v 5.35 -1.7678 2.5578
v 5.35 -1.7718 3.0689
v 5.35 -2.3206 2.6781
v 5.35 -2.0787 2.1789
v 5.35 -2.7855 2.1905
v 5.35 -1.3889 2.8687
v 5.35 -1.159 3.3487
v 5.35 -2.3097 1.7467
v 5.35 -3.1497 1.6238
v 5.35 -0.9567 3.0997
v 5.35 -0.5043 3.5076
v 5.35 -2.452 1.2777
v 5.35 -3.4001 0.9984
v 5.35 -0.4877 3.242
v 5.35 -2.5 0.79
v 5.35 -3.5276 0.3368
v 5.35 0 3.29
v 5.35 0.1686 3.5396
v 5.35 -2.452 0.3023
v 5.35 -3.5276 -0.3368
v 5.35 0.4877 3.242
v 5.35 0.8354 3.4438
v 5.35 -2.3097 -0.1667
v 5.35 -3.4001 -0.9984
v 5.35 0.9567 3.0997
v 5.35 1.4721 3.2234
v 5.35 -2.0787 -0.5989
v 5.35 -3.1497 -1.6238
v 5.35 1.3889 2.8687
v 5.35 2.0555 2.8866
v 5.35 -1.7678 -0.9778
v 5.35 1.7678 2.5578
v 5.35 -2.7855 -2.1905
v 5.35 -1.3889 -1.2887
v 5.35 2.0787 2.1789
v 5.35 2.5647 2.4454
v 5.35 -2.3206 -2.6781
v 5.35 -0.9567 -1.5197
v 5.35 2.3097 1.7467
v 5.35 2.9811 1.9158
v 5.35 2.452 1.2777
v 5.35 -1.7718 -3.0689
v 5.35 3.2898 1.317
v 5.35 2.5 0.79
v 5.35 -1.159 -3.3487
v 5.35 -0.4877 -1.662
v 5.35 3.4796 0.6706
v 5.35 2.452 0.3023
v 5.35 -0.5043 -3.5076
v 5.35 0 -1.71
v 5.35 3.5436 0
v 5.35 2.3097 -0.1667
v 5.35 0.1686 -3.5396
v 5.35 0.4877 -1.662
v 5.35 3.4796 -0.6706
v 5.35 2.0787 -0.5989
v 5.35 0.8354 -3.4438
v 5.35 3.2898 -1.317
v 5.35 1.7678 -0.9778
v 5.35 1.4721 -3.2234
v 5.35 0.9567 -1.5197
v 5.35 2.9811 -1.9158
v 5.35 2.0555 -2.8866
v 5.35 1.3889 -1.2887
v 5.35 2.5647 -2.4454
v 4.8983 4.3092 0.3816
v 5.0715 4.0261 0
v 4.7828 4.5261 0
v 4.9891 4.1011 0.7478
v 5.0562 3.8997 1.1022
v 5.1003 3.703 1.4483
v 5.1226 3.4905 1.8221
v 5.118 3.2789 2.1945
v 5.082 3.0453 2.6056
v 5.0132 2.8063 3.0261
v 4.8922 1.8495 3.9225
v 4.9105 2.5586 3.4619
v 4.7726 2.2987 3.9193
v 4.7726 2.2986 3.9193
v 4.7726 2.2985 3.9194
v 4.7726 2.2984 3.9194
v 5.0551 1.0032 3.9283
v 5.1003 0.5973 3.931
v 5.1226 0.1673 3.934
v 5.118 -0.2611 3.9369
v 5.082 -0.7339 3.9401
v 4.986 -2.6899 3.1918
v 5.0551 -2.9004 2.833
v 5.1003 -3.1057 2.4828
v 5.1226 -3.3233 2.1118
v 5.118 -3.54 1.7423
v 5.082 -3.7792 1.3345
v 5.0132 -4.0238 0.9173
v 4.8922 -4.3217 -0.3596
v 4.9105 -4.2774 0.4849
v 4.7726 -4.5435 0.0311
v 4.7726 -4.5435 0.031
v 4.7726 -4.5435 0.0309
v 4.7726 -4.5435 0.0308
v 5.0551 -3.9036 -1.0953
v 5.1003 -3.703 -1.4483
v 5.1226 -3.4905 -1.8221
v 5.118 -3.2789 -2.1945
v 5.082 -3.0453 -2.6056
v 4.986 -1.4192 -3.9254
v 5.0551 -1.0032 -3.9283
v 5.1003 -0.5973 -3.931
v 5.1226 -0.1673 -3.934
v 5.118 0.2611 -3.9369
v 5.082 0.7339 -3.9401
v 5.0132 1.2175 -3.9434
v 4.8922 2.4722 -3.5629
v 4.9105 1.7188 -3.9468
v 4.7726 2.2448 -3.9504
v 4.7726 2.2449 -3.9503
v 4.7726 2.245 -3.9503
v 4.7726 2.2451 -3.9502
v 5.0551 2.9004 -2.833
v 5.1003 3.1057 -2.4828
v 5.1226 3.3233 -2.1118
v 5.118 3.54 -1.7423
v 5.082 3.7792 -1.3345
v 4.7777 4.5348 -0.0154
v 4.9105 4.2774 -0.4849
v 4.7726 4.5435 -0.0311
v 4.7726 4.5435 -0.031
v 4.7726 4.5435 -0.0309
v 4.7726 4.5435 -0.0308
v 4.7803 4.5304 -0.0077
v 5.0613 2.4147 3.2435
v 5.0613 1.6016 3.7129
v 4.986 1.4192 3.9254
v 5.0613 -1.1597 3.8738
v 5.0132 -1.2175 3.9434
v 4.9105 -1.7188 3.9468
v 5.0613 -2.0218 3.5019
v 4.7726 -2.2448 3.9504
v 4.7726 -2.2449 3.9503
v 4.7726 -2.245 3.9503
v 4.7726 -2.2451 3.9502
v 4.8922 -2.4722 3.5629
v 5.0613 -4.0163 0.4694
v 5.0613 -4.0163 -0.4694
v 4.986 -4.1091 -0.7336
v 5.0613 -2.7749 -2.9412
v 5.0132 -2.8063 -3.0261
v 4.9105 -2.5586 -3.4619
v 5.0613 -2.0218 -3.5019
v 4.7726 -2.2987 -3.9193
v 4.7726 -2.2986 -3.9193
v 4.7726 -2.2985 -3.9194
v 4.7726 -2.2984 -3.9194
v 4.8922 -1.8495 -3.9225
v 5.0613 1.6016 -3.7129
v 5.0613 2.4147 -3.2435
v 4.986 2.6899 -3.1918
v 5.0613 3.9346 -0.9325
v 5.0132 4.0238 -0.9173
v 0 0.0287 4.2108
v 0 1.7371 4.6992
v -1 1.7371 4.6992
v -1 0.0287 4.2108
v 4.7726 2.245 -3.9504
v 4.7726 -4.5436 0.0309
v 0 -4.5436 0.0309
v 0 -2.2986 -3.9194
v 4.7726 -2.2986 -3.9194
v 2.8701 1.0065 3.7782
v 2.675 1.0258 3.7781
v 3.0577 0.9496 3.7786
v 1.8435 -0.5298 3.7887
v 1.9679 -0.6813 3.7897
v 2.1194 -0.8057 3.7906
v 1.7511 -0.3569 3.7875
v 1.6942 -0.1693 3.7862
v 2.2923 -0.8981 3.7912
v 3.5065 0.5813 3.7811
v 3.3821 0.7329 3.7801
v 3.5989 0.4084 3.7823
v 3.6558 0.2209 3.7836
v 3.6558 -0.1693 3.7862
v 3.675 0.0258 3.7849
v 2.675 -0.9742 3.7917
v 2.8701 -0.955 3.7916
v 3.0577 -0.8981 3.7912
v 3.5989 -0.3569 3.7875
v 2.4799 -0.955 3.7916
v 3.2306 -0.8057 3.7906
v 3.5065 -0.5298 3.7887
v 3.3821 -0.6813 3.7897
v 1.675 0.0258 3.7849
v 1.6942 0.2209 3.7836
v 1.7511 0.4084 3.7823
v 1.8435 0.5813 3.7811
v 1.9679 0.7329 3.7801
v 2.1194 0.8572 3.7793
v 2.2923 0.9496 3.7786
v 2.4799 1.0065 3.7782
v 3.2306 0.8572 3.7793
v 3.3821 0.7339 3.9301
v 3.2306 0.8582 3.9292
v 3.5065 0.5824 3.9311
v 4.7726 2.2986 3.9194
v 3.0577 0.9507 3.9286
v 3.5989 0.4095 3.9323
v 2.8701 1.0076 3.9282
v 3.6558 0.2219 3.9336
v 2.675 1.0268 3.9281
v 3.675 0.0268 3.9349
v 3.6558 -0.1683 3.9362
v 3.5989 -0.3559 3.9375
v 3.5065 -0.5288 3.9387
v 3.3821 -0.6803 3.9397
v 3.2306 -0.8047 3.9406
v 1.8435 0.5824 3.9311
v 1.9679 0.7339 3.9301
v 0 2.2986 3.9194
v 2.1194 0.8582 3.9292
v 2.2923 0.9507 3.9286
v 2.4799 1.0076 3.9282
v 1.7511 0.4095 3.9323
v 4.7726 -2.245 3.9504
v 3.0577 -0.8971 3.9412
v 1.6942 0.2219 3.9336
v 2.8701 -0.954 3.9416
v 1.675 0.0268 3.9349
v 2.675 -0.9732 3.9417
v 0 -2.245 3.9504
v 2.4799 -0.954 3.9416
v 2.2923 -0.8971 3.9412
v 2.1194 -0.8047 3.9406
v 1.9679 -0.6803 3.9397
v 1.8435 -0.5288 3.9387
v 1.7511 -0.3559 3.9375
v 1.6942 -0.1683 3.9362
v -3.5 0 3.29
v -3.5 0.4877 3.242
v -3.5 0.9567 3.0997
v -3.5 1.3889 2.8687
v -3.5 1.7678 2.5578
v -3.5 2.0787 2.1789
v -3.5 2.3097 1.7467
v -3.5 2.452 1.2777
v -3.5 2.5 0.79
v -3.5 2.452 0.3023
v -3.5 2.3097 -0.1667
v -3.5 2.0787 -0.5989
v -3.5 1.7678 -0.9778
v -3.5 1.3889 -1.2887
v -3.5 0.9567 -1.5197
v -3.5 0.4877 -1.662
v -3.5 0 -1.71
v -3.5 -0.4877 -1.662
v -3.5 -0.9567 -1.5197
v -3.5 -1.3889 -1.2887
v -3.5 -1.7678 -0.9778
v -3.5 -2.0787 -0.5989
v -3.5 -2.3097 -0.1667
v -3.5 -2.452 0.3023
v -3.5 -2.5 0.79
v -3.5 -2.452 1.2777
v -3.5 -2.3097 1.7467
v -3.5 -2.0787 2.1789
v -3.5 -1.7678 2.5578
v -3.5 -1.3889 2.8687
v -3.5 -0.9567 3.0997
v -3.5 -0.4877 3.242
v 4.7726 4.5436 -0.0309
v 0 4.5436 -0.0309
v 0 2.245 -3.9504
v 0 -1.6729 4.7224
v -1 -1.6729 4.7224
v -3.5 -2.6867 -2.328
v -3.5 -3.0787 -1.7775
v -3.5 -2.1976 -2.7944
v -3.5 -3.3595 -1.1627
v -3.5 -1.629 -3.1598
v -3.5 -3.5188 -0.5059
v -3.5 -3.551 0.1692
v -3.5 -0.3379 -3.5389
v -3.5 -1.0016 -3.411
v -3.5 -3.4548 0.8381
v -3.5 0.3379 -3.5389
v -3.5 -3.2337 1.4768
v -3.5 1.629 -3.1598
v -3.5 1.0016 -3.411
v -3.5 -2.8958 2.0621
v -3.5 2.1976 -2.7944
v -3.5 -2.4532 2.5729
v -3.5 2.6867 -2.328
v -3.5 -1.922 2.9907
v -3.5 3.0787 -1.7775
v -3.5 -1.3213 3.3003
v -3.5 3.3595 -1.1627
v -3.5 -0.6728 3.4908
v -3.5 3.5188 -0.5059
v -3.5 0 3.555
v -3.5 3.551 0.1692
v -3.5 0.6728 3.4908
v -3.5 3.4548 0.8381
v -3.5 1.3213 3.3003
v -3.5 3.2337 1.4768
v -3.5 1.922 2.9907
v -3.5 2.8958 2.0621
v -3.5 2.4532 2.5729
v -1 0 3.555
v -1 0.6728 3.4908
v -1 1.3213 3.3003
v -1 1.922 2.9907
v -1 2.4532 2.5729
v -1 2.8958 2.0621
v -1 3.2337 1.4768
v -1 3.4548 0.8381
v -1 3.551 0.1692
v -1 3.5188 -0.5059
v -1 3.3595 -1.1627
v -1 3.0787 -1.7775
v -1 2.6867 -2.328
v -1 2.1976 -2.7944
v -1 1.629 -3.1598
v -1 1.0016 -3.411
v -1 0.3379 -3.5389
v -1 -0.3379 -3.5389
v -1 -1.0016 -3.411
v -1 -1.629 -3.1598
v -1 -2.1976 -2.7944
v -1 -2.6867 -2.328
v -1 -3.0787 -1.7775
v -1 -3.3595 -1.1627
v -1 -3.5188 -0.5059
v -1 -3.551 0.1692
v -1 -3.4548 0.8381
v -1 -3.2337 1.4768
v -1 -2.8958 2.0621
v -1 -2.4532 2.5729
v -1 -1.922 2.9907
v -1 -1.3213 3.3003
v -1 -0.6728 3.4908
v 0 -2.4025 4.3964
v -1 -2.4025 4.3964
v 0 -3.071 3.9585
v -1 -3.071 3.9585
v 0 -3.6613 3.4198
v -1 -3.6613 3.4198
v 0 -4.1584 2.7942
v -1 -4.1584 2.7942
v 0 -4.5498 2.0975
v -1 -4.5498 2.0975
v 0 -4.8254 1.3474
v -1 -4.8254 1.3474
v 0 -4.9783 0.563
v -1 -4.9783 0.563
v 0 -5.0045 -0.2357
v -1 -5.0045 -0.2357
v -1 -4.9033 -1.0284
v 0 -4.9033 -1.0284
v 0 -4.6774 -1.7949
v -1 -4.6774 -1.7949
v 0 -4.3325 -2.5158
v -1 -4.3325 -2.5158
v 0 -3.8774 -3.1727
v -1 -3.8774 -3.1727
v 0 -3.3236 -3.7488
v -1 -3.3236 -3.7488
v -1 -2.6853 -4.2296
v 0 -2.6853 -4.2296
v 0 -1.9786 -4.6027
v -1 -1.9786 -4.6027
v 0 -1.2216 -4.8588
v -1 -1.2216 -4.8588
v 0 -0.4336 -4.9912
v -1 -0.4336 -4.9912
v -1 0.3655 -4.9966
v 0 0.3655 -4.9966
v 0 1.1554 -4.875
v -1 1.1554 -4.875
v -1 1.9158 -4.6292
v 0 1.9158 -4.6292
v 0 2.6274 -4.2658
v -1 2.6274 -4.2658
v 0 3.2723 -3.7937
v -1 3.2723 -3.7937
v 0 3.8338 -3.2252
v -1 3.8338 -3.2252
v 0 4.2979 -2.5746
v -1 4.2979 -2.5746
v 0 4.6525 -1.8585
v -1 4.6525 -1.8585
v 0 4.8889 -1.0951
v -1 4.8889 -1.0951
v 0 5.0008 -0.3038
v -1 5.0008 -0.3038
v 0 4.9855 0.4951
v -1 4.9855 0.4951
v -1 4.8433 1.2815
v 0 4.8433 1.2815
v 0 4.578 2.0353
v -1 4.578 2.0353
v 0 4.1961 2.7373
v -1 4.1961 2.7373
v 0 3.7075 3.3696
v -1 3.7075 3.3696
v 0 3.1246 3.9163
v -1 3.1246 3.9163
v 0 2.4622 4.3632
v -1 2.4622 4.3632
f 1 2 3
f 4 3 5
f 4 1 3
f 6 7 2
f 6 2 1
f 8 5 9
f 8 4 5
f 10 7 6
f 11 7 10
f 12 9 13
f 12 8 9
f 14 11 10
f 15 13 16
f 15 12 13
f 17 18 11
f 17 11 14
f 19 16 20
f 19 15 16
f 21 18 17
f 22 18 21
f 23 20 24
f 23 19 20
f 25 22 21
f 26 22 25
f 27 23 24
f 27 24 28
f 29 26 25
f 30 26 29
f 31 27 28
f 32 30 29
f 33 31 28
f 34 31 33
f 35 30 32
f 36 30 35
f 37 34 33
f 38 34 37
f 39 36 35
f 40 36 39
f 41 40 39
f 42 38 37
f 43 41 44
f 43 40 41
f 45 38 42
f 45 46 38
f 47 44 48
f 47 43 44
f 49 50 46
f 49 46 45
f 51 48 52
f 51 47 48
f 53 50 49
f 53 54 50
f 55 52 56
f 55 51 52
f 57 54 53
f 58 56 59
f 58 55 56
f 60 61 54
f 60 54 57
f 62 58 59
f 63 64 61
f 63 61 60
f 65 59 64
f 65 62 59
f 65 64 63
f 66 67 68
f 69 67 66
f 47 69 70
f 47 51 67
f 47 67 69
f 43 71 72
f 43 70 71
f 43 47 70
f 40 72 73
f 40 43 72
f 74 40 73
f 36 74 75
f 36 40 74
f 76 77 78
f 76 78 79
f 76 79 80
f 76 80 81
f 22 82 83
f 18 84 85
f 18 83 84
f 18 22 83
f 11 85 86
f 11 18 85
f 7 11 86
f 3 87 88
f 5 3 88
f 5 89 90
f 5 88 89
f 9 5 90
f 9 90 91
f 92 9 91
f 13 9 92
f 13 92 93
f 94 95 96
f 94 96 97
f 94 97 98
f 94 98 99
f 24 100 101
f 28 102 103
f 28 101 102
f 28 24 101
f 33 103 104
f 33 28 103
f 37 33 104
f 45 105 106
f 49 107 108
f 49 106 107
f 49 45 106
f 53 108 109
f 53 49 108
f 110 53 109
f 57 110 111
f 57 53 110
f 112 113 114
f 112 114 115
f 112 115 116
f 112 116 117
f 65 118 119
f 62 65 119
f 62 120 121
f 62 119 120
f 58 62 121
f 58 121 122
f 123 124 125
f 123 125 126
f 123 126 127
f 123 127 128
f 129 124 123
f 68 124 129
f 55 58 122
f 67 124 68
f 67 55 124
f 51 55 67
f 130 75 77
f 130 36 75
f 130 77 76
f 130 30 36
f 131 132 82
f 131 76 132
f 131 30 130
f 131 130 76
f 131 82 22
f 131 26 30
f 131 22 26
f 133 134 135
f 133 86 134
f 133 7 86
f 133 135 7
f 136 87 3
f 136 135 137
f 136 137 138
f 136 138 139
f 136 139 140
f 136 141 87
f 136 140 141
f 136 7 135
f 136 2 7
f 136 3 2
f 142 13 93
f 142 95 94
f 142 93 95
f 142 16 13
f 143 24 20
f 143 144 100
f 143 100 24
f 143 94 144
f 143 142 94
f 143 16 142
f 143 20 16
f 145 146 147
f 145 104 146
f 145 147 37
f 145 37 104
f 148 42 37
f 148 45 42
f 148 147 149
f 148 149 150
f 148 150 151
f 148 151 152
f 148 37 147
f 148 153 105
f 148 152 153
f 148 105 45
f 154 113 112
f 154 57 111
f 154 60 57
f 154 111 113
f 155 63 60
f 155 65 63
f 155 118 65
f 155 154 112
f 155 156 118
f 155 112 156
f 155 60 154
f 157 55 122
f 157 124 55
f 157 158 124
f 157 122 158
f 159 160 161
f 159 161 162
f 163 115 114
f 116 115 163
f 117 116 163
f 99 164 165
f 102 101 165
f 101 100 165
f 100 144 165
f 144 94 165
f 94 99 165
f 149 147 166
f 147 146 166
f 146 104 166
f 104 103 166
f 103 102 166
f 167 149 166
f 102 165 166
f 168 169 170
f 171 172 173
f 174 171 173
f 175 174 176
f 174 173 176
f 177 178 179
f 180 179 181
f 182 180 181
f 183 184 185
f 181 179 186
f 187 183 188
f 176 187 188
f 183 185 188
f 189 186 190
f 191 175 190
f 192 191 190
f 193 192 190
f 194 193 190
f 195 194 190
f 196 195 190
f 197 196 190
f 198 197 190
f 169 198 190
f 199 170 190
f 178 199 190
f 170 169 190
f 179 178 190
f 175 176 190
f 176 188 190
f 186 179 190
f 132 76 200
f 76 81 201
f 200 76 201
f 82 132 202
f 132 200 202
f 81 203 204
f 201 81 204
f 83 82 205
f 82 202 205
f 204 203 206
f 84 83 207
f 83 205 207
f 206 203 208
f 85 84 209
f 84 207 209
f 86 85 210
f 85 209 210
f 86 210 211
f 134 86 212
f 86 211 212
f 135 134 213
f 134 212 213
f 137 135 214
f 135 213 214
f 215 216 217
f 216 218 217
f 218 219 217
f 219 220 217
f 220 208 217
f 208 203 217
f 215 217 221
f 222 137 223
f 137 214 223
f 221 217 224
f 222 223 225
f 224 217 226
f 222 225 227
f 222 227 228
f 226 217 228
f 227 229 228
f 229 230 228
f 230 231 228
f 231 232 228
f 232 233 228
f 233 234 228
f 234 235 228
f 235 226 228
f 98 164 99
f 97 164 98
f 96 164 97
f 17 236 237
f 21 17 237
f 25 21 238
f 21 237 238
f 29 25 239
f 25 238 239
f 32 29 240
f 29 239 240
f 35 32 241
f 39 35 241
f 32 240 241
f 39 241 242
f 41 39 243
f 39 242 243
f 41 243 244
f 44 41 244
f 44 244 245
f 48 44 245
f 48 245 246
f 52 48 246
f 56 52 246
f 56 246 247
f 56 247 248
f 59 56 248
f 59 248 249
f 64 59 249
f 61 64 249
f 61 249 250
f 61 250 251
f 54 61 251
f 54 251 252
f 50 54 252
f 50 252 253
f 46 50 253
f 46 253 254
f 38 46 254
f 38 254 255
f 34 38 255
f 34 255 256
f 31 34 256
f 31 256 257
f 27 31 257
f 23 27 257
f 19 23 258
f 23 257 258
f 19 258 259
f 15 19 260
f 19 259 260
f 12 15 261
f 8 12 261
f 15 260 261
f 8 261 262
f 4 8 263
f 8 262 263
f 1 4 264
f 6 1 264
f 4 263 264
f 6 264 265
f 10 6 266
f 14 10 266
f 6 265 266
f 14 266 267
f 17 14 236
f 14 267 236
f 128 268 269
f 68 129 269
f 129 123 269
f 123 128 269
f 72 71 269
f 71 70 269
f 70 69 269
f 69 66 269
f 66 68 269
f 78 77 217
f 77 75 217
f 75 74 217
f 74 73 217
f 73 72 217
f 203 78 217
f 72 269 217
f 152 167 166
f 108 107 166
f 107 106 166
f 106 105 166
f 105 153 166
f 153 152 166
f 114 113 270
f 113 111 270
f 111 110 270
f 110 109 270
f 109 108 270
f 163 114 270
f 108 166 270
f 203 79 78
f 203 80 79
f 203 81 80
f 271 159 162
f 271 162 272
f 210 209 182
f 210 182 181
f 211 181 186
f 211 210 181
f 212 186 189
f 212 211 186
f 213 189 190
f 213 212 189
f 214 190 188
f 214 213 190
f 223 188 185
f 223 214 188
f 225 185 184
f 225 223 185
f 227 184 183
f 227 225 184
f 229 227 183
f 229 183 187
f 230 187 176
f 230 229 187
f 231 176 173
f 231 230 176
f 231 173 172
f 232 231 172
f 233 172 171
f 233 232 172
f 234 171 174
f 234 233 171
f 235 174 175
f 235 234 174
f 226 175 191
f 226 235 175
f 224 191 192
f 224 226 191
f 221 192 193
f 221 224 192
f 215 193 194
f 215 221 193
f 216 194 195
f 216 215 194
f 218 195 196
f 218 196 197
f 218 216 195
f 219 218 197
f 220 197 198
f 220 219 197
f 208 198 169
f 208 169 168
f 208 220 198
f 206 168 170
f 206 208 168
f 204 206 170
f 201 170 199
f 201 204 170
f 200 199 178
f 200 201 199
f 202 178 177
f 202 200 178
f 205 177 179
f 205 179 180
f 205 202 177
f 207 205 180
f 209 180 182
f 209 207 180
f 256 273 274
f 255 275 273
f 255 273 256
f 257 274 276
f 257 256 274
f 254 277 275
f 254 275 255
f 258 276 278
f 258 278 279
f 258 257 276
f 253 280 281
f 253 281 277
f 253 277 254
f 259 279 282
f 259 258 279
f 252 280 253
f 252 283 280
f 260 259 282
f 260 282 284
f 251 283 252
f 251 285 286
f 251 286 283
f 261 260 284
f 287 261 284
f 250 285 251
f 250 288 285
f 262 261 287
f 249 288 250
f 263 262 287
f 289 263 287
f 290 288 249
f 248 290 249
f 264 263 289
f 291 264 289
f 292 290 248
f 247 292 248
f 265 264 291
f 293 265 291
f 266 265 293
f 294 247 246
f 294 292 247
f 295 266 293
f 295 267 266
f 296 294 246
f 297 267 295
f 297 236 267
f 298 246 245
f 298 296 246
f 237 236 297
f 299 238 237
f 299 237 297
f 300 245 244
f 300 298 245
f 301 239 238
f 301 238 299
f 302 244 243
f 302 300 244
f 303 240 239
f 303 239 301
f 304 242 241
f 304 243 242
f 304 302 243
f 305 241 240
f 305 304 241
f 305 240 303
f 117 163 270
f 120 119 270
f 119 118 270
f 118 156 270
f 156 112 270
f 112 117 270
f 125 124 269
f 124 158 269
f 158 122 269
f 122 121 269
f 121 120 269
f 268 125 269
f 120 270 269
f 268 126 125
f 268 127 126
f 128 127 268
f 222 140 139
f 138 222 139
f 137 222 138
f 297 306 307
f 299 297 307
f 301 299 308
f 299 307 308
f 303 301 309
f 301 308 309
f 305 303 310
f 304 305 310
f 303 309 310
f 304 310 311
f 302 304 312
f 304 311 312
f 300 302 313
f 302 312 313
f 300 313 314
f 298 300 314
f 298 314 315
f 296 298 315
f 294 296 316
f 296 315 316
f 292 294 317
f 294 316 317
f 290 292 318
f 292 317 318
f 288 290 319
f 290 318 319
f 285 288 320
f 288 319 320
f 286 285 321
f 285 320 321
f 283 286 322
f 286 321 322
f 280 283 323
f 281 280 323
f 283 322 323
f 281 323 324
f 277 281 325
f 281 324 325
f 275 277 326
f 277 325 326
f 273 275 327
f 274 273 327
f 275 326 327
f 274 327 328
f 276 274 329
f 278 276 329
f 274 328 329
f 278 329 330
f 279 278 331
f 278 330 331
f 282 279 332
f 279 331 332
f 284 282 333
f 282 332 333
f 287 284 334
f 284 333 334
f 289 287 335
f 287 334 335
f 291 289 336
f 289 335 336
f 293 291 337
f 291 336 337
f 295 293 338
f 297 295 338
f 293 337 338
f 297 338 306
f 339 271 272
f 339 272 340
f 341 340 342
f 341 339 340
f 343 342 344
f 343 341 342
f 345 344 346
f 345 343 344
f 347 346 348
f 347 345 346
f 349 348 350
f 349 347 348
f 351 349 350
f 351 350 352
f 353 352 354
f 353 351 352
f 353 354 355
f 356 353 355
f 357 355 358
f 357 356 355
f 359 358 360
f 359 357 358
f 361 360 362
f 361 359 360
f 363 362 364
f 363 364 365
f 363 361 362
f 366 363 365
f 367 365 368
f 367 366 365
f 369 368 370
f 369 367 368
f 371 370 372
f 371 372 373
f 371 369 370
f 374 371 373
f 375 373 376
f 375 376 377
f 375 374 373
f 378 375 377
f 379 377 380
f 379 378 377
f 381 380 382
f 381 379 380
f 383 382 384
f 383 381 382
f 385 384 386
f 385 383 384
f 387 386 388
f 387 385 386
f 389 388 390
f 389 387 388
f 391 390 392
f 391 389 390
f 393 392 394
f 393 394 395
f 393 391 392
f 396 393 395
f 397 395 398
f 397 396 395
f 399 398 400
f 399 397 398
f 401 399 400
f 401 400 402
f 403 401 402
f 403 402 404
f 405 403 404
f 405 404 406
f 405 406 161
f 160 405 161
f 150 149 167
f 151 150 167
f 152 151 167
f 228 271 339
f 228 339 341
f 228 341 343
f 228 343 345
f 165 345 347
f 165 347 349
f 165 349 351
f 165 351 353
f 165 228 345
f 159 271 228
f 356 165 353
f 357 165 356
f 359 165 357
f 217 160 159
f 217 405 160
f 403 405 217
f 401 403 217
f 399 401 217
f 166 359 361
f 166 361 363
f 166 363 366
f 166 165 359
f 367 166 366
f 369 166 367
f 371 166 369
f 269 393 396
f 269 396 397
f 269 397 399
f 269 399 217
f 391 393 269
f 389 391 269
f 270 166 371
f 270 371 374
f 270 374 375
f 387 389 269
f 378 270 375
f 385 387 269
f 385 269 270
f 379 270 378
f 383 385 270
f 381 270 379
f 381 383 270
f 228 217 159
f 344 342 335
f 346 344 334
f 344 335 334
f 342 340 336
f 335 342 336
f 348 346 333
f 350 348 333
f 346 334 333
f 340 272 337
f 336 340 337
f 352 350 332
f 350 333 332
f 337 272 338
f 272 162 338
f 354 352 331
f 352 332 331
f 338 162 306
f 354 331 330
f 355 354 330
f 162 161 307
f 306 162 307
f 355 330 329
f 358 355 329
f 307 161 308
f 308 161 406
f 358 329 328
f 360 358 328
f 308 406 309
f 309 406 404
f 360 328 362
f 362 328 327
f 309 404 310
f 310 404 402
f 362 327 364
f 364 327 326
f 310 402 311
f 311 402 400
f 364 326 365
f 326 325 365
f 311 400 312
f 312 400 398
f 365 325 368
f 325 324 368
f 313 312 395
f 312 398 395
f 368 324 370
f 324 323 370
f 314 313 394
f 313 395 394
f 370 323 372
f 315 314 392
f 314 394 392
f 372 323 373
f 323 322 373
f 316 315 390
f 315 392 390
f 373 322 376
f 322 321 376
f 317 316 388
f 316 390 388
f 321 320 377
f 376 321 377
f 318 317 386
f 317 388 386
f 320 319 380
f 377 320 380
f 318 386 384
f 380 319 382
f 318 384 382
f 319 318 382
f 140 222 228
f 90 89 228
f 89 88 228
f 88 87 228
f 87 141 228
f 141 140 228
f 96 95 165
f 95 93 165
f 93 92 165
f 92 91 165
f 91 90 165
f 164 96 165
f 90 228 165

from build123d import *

# Parameters (mm, degrees)
BOSS_EXTRUDE1_DEPTH = 5.35
BOSS_EXTRUDE3_DEPTH = 1
SKETCH4_R           = 3.555
BOSS_EXTRUDE4_DEPTH = 2.5
SKETCH5_R           = 1
CUT_EXTRUDE3_DEPTH  = 0.15
SKETCH3_R           = 2.5
CUT_EXTRUDE5_DEPTH  = 9.85


with BuildPart() as part:
    # Sketch2 → Boss-Extrude1 (new body)
    with BuildSketch(Plane(origin=(0, 0, 0), x_dir=(0, 0, -1), z_dir=(1, 0, 0))):
        Polygon((3.919437566, -2.29861752), (3.950379949, 2.245023741), (0.030942383, 4.54364126), (-3.919437566, 2.29861752), (-3.950379949, -2.245023741), (-0.030942383, -4.54364126), align=None)
    extrude(amount=BOSS_EXTRUDE1_DEPTH)

    # Sketch6 → Boss-Extrude3 (add)
    with BuildSketch(Plane.ZY):
        with BuildLine():
            Line((4.699218, 1.737080939), (4.210840713, 0.028675997))
            Line((4.210840713, 0.028675997), (4.722440239, -1.672919061))
            ThreePointArc((4.722440239, -1.672919061), (-5.009883831, -0.034117514), (4.699218, 1.737080939))
        make_face()
    extrude(amount=BOSS_EXTRUDE3_DEPTH)

    # Sketch4 → Boss-Extrude4 (add)
    with BuildSketch(Plane.ZY.offset(1)):
        Circle(SKETCH4_R)
    extrude(amount=BOSS_EXTRUDE4_DEPTH)

    # Sketch5 → Cut-Extrude3 (cut)
    with BuildSketch(Plane(origin=(0, 0.02679689, 3.934908757), x_dir=(1, 0, 0), z_dir=(0, -0.006809883, -0.999976812))):
        with Locations((2.675, 0)):
            Circle(SKETCH5_R)
    extrude(amount=CUT_EXTRUDE3_DEPTH, mode=Mode.SUBTRACT)

    # Sketch3 → Cut-Extrude5 (cut, through all)
    with BuildSketch(Plane.ZY.offset(3.5)):
        with Locations((0.79, 0)):
            Circle(SKETCH3_R)
    extrude(amount=-CUT_EXTRUDE5_DEPTH, mode=Mode.SUBTRACT)

    # Sketch7 → Cut-Revolve1 (revolve, cut)
    with BuildSketch(Plane.XY):
        Polygon((4.772649731, 4.54364126), (5.35, 3.54364126), (9.772649731, 3.54364126), (9.772649731, 8.54364126), (4.772649731, 8.54364126), align=None)
    revolve(axis=Axis((0, 0, 0), (1, 0, 0)), mode=Mode.SUBTRACT)


solid = part.part
